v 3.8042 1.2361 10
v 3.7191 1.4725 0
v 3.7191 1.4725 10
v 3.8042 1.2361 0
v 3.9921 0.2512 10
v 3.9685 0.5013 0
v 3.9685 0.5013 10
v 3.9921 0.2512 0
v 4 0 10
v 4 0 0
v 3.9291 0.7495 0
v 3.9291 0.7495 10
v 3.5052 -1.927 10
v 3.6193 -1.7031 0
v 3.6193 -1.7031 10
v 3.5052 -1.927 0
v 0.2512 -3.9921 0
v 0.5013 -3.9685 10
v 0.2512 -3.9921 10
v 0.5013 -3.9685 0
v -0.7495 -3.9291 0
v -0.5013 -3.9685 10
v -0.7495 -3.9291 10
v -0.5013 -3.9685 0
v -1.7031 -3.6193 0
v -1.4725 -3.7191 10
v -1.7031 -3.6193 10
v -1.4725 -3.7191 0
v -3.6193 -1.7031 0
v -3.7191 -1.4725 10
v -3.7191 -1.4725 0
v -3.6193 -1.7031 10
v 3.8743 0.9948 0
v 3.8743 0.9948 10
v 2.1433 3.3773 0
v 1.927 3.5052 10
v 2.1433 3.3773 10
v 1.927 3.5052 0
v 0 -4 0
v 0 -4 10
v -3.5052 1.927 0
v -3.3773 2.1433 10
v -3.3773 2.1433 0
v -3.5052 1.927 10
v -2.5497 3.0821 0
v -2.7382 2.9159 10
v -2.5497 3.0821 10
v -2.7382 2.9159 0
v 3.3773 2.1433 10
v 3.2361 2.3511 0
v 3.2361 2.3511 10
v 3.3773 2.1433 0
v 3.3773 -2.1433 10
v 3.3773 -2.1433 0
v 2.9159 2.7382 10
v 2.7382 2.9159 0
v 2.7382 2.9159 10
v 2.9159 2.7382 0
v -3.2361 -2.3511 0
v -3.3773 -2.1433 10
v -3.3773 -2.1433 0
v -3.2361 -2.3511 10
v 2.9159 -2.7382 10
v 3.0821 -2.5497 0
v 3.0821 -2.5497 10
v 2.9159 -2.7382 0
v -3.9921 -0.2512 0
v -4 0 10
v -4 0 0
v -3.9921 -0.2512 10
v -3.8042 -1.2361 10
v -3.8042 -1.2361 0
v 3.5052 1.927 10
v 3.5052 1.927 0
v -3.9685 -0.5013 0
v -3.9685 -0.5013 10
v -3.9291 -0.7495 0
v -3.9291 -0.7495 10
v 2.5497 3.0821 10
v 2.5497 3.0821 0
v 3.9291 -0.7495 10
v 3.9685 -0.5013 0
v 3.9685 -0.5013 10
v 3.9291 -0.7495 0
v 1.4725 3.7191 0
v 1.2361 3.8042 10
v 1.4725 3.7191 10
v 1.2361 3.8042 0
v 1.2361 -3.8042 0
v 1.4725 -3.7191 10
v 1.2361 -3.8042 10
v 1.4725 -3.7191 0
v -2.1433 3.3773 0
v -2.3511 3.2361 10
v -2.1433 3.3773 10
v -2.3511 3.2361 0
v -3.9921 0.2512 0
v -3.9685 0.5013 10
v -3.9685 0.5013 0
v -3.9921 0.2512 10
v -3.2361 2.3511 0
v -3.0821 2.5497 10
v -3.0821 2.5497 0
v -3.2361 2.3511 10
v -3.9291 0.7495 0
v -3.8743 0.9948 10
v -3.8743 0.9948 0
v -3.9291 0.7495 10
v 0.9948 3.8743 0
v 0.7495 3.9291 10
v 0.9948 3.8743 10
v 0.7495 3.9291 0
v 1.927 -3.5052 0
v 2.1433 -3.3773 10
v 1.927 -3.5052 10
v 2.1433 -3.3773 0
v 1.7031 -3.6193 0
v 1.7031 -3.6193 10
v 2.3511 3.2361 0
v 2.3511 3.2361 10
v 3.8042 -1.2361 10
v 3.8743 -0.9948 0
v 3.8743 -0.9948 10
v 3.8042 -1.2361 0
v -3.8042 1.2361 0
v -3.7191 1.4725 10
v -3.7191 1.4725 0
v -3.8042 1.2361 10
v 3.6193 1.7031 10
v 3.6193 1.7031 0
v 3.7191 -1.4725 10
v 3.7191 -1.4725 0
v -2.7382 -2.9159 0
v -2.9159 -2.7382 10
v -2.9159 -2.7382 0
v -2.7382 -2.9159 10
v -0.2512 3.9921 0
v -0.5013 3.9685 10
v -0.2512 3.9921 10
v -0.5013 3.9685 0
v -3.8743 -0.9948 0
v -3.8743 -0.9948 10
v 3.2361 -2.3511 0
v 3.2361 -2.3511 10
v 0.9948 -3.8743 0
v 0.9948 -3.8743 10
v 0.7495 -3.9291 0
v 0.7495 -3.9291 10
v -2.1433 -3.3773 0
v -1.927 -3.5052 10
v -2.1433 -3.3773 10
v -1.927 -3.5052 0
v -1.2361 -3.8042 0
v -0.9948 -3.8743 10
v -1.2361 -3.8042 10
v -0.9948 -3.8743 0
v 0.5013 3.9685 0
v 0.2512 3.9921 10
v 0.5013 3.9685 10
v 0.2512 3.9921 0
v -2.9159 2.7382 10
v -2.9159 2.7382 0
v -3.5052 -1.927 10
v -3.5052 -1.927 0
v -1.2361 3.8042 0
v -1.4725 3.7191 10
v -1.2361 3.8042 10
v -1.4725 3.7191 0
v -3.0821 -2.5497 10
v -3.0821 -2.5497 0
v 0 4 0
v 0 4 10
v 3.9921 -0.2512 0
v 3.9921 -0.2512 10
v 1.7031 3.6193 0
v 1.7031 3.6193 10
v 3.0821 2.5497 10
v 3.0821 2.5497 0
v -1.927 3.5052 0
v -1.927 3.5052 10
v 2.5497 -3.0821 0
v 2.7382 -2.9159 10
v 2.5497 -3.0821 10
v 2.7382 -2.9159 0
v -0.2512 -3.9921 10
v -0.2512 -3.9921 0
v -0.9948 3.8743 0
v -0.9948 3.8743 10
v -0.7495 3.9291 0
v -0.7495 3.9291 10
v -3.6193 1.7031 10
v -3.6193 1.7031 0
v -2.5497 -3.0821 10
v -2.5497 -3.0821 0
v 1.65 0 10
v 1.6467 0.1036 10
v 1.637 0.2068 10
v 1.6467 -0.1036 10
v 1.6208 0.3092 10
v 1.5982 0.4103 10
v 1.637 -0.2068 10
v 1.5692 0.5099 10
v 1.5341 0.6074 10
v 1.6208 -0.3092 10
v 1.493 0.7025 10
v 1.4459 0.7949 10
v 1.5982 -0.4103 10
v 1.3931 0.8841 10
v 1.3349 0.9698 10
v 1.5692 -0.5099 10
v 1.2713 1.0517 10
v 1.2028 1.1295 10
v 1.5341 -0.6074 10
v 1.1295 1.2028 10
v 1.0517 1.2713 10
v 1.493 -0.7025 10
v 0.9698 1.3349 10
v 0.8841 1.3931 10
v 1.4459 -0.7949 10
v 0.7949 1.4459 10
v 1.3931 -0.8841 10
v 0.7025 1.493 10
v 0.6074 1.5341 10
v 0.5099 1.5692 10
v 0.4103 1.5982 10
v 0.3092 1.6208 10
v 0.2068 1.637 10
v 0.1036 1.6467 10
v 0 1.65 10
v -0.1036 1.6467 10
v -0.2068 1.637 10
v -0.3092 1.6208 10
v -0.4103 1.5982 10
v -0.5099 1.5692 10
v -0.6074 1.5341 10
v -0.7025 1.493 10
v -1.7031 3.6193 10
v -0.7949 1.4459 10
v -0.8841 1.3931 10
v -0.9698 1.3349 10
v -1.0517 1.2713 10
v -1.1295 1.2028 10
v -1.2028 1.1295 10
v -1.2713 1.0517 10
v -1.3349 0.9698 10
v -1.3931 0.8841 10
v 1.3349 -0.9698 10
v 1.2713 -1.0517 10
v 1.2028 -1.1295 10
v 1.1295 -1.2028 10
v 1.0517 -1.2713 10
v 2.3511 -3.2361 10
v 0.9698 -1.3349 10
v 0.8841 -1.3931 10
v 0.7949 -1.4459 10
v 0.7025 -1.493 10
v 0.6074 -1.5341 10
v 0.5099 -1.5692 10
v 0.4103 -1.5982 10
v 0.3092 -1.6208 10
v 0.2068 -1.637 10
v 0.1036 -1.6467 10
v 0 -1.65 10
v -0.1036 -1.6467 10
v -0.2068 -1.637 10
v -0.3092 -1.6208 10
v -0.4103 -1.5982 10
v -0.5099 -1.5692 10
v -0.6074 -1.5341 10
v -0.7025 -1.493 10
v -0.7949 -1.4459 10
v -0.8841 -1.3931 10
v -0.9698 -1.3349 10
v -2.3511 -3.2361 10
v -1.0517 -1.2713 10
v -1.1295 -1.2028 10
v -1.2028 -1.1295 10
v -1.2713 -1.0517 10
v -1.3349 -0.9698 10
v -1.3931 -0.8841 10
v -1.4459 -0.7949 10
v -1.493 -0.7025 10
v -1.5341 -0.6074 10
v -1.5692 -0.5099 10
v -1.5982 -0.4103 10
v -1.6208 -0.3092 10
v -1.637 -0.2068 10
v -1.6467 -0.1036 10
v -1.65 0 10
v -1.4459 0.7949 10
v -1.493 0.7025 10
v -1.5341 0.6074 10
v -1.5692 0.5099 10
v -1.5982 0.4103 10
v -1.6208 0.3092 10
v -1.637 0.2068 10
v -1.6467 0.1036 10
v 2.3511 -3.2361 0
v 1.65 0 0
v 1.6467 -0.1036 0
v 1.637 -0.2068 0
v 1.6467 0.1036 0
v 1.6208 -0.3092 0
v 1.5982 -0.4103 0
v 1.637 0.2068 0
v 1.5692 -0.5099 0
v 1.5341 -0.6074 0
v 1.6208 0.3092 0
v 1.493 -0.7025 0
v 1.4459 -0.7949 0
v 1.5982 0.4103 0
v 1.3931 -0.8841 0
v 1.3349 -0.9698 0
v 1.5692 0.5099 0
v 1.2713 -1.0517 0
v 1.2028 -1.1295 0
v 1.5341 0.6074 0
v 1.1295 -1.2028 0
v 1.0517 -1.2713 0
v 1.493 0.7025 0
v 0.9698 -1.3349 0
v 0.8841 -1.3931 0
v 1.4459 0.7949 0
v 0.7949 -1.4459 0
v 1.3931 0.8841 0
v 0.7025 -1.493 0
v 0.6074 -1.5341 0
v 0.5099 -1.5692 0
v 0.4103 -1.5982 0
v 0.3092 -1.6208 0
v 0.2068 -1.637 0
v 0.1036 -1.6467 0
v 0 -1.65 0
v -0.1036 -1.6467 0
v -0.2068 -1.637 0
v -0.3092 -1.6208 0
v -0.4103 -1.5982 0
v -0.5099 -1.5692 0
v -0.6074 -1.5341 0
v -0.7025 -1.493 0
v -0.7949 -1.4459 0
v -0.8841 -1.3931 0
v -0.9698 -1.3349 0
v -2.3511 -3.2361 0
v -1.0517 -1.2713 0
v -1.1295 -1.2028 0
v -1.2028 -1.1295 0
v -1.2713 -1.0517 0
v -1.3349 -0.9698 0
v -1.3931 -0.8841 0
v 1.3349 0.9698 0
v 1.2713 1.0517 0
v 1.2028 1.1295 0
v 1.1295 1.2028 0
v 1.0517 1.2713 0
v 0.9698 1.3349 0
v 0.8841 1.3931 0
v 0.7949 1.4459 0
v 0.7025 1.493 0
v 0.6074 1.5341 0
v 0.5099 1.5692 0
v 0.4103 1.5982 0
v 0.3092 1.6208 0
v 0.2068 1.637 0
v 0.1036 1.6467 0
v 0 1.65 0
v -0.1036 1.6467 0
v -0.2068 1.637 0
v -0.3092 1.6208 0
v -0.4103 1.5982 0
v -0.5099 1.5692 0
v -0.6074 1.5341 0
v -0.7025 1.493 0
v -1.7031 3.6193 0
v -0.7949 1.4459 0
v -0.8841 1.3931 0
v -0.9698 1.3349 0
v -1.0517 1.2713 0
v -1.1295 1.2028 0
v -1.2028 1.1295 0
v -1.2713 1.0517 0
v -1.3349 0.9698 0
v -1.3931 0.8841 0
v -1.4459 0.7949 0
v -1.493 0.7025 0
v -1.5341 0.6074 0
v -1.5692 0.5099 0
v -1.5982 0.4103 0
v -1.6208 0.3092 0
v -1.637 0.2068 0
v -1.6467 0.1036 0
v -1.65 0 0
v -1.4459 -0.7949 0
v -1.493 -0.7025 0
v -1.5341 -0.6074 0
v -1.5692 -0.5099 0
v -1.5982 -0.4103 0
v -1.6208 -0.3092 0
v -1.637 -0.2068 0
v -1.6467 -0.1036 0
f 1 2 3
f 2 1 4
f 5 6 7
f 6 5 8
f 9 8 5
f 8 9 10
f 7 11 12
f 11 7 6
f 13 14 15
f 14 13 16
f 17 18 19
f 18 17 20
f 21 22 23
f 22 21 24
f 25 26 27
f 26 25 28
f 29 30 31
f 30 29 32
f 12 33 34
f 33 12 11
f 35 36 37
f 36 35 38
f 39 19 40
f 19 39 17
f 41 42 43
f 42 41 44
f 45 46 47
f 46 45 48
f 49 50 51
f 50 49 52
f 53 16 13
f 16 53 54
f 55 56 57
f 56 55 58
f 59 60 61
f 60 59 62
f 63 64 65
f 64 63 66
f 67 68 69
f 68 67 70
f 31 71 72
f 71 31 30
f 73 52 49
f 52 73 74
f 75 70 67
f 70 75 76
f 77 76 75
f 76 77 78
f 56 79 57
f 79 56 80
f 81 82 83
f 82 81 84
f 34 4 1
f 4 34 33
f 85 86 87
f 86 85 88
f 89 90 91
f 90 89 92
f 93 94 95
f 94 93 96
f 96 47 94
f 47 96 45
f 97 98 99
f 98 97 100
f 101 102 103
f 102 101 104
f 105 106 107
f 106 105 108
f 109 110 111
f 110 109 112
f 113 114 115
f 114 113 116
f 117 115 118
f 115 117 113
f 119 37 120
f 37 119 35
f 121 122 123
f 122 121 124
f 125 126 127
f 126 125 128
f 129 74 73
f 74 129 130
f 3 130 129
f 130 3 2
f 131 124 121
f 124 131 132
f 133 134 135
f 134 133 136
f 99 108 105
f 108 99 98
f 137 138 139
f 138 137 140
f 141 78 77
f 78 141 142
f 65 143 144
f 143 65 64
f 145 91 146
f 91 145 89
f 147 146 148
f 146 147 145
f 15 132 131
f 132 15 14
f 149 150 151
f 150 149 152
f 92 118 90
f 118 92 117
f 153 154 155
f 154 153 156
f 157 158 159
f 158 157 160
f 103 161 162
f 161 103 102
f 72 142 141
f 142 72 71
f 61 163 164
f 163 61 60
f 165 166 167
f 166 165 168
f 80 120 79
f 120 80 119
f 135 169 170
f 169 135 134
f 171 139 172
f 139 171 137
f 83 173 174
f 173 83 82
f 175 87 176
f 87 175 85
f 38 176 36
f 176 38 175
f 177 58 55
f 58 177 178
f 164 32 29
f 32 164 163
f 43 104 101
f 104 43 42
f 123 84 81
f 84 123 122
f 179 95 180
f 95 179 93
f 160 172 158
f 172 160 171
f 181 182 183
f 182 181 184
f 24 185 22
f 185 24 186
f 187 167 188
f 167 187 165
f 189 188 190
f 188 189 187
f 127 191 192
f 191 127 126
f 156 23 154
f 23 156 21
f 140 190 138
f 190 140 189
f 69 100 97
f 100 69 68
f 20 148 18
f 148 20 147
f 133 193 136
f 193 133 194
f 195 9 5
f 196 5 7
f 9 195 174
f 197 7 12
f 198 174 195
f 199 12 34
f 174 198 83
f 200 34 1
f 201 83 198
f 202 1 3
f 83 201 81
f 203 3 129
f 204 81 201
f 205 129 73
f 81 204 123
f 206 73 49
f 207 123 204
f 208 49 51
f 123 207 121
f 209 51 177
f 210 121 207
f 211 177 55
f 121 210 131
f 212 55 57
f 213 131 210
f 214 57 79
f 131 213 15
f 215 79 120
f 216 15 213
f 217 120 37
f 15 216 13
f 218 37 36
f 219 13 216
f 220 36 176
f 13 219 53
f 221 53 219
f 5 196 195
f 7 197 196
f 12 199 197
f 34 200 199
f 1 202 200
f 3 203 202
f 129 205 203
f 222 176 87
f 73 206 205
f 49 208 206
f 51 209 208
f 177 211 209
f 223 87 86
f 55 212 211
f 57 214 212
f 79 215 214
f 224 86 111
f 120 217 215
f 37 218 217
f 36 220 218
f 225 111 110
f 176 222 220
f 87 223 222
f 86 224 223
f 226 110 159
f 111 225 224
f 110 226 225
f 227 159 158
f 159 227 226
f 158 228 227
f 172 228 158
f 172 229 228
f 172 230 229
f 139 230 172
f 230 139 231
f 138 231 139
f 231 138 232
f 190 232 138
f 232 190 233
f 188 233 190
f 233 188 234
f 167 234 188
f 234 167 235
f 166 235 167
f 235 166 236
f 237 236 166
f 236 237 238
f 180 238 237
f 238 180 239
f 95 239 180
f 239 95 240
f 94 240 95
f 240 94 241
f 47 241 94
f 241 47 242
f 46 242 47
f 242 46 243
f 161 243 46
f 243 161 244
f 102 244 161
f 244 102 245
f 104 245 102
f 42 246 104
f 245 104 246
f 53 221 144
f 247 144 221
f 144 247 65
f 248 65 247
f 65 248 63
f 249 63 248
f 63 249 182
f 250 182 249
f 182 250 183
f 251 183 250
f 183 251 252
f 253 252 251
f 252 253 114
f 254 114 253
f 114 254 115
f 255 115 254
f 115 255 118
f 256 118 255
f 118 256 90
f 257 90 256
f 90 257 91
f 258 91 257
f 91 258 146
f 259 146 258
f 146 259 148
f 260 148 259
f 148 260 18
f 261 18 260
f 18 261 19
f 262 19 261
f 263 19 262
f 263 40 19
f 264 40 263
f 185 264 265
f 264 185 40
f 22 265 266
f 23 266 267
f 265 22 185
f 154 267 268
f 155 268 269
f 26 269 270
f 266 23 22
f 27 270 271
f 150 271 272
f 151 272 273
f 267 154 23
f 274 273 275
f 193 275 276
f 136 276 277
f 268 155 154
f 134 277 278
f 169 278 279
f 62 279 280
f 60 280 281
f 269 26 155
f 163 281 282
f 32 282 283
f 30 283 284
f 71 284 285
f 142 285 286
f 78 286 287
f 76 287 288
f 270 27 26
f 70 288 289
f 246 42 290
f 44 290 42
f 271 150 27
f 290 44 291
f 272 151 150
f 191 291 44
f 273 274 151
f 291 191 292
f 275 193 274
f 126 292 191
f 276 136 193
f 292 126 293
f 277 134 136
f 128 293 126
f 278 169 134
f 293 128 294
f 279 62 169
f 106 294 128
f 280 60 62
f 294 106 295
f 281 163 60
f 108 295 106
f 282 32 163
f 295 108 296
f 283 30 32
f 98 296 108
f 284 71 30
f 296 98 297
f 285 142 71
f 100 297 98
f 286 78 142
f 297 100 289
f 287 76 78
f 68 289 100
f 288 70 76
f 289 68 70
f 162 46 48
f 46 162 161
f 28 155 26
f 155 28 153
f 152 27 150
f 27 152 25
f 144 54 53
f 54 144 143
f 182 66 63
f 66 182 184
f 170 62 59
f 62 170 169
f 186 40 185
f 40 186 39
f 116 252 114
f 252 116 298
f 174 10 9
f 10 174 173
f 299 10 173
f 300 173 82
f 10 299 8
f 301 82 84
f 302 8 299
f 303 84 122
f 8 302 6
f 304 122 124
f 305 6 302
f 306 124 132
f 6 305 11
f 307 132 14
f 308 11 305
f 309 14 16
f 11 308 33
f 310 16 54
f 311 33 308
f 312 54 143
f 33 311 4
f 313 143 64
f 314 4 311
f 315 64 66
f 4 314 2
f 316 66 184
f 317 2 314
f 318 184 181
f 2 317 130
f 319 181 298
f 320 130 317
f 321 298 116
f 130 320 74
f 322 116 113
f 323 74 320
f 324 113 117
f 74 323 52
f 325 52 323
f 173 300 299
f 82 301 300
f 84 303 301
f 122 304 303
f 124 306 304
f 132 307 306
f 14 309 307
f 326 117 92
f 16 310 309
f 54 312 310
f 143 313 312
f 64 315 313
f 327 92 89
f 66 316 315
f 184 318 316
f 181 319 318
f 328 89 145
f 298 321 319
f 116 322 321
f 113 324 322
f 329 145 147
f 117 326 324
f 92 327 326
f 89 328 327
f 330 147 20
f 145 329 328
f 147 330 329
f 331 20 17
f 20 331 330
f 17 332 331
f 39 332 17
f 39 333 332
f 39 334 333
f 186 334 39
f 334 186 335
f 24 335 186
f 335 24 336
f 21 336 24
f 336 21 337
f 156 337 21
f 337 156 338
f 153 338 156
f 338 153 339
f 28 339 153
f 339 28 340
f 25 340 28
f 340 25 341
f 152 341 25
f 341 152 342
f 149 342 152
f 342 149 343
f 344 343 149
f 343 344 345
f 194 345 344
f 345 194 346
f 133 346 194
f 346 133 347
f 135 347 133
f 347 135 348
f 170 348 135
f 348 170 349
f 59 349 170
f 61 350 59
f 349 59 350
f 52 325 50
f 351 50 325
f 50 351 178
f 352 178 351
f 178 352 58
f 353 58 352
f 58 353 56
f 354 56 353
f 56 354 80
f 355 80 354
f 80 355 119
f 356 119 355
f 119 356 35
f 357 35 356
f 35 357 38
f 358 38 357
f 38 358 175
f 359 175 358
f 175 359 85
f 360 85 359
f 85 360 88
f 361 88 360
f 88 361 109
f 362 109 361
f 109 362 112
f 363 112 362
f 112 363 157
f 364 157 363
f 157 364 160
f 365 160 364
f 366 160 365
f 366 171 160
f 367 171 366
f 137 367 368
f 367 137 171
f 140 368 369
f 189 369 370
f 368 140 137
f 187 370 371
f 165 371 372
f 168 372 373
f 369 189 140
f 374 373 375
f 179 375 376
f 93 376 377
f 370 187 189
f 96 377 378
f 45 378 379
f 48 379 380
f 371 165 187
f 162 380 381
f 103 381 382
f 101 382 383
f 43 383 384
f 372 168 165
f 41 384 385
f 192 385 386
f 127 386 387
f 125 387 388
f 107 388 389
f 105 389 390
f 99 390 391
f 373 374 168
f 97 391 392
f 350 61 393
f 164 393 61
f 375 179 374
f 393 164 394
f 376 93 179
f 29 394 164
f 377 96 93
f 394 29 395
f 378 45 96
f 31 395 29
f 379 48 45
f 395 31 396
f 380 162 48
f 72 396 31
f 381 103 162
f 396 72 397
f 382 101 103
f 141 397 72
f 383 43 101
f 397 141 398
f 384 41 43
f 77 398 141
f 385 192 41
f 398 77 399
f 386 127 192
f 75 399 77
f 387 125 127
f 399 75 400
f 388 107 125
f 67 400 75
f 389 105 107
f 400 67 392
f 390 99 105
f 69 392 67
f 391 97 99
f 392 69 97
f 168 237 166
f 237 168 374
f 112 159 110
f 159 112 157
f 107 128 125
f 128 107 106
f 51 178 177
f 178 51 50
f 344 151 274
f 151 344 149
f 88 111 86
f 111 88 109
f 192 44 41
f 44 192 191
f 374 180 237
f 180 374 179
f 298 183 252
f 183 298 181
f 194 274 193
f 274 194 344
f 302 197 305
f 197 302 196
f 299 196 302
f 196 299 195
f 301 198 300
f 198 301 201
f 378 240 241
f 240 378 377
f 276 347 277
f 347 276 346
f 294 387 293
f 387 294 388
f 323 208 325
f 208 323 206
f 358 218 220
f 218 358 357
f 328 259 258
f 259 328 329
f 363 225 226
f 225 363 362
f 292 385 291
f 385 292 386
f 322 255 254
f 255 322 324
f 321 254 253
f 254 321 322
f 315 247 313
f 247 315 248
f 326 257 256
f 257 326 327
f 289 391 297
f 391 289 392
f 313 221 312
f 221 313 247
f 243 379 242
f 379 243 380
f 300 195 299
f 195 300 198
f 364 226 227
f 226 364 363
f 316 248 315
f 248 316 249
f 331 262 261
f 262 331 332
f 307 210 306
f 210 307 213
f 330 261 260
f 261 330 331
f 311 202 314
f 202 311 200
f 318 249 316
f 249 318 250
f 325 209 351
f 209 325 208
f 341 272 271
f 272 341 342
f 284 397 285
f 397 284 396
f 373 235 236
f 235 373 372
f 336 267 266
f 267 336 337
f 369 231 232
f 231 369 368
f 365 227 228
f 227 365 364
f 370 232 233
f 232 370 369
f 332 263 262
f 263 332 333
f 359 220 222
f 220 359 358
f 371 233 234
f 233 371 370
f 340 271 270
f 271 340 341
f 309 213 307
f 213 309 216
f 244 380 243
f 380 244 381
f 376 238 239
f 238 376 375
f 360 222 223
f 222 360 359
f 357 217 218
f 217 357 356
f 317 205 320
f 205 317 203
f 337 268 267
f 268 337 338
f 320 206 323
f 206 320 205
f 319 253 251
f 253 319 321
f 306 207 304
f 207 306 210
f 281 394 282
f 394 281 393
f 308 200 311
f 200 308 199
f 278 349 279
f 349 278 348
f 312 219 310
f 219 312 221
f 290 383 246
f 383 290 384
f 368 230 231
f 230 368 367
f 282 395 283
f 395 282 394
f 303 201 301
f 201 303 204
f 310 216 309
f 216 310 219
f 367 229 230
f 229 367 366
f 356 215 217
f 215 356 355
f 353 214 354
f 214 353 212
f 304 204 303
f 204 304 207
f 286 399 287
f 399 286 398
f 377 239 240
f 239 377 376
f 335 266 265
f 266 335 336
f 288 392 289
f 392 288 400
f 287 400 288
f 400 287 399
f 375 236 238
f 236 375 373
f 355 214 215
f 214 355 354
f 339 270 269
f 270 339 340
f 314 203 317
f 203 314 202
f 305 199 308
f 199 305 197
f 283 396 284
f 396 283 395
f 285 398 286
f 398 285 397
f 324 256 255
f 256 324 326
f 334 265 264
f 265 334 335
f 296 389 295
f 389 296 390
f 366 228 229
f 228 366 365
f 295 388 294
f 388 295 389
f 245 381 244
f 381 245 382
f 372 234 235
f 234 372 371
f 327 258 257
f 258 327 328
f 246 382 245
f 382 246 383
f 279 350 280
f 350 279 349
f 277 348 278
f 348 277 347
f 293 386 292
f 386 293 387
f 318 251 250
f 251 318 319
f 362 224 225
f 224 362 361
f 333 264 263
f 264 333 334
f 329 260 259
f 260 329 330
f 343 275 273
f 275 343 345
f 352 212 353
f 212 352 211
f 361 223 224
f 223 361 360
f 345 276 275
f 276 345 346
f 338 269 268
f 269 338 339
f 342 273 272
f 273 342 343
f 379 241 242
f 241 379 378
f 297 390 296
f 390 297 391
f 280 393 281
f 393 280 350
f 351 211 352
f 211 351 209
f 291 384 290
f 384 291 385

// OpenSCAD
//simple pcb standoff library - By the DoomMeister
/* Types will be through hole, captured nut, split column (with and without base)
v1 - First Release
v1.1 - Tidied Split Base
v1.2 - added support for end nut
//Released under the terms of the GNU GPL v3.0
This program is free software: you can redistribute it and/or modify
it under the terms of the GNU General Public License as published by
the Free Software Foundation, either version 3 of the License, or
(at your option) any later version.

This program is distributed in the hope that it will be useful,
but WITHOUT ANY WARRANTY; without even the implied warranty of
MERCHANTABILITY or FITNESS FOR A PARTICULAR PURPOSE. See the
GNU General Public License for more details.

You should have received a copy of the GNU General Public License
along with this program. If not, see <http://www.gnu.org/licenses/>.
*/
include<MCAD/metric_fastners.scad>

//>>>>>>>>>>>>>>>>>>>>>>>>>>>>>>>>>>>>>>>>>>>>>>>>>>>>>>>>>>>>>>>>>>>>>>>>>>>
//usage
//>>>>>>>>>>>>>>>>>>>>>>>>>>>>>>>>>>>>>>>>>>>>>>>>>>>>>>>>>>>>>>>>>>>>>>>>>>>
/*
pcb_stand_off(
				type="plain",  THIS IS THE TYPE OF STAND OFF plain, end_nut, split_base 
				hex=true, 		THIS IS THE OUTSIDE SHAPE IS IT HEXAGONAL OR ROUND,NOT USED ON SPLIT TYPE
				od = 10, 		OUTSIDE DIAMETER
				id = 3,        THREAD SIZE FOR INNER DIAMETER, HOLE SIZE FOR SPLIT TYPE
				len = 12, 		LENGTH, SUPPORT HEIGHT FOR SPLIT TYPE
				cl=0.3,  		CLEARANCE
				thk_base,		BASE THICKNESS FOR SPLIT TYPE
				thk_pcb);		PCB THICKNESS


*/
//>>>>>>>>>>>>>>>>>>>>>>>>>>>>>>>>>>>>>>>>>>>>>>>>>>>>>>>>>>>>>>>>>>>>>>>>>>>
//Customiser Stuff - Comment out to use as libray
//>>>>>>>>>>>>>>>>>>>>>>>>>>>>>>>>>>>>>>>>>>>>>>>>>>>>>>>>>>>>>>>>>>>>>>>>>>>
//Setup
///*
//Plain, Retained Nut or Split Pillar With Base
Stand_Off_Type = "plain"; // [plain,end_nut,split_base]
//Round or Hex Outside
Hexagon = "false"; //[false,true]
//Outside or Base Diameter
Outside_Diameter = 8;
//Thread Size (metric ) or hole size (Split Type)
Inside_Diameter = 3;
//Length or PCB Spaceing
Length = 10;
//
Clearance = 0.3;
//(split type only)
Base_Thickness = 1.5;
//(split type only)
PCB_Thickness = 1.5;



//Thing
pcb_stand_off(type=Stand_Off_Type,hex=Hexagon, od = Outside_Diameter, id = Inside_Diameter, len = Length, cl=Clearance, thk_base=Base_Thickness,thk_pcb=PCB_Thickness);

//*/
//>>>>>>>>>>>>>>>>>>>>>>>>>>>>>>>>>>>>>>>>>>>>>>>>>>>>>>>>>>>>>>>>>>>>>>>>>>>
//draw test - comment this out for library use
//>>>>>>>>>>>>>>>>>>>>>>>>>>>>>>>>>>>>>>>>>>>>>>>>>>>>>>>>>>>>>>>>>>>>>>>>>>>
/*
spaceing = 15*1;
translate([0*spaceing,0*spaceing,0])color("red")pcb_stand_off(type="plain",hex=true, od = 10, id = 3, len = 12, cl=0.3,thk_base=3,thk_pcb=1.5);
translate([1*spaceing,0*spaceing,0])color("green")pcb_stand_off(type="end_nut",hex=false, od = 10, id = 3, len = 12, cl=0.3);
translate([1*spaceing,1*spaceing,0])color("blue")pcb_stand_off(type="split_base", od = 10, id = 3, len = 8, cl=0.3, thk_base=1.5,thk_pcb=1.5);
*/
//>>>>>>>>>>>>>>>>>>>>>>>>>>>>>>>>>>>>>>>>>>>>>>>>>>>>>>>>>>>>>>>>>>>>>>>>>>>
//outer module
//>>>>>>>>>>>>>>>>>>>>>>>>>>>>>>>>>>>>>>>>>>>>>>>>>>>>>>>>>>>>>>>>>>>>>>>>>>>

module pcb_stand_off(type="plain",hex=false, od = 2, id = 3, len = 8, cl=0.3,thk_base=3,thk_pcb=1.5)
{
if (type=="plain")
	{
		if (hex=="false")
			{
				stand_off(_od=od, _id = id,_len = len,_cl = cl);
			}
		if (hex=="true")
			{
				stand_off_hex(_od=od, _id = id,_len = len,_cl = cl);
			}
	}
if (type=="end_nut")
	{
		if (hex=="false")
			{
				end_nut_stand_off(_od=od, _id = id,_len = len,_cl = cl);
			}
		if (hex=="true")
			{
				end_nut_stand_off_hex(_od=od, _id = id,_len = len,_cl = cl);
			}
	}
if (type=="split_base")
	{

				split_base_stand_off(_od=od, _id = id,_len = len,_cl = cl,_thk_base=thk_base,_thk_pcb=thk_pcb);


	}
}

//>>>>>>>>>>>>>>>>>>>>>>>>>>>>>>>>>>>>>>>>>>>>>>>>>>>>>>>>>>>>>>>>>>>>>>>>>>>
//inner modules
//>>>>>>>>>>>>>>>>>>>>>>>>>>>>>>>>>>>>>>>>>>>>>>>>>>>>>>>>>>>>>>>>>>>>>>>>>>>

module end_nut_stand_off(_od=2, _id = 2,_len = 8,_cl = 0.3)
{
	union()
	{
	difference(){
		cylinder(r = _od/2, h = _len, $fn=100);
		translate([0,0,-1])cylinder(r = (_id + _cl)/2, h = _len+2, $fn=100);
		translate([0,0,0])flat_nut(_id+_cl,apply_chamfer=false);
		translate([0,0,_len-(0.8*(_id+_cl))+.01])flat_nut(_id+_cl,apply_chamfer=false);
		}
		translate([0,0,(0.8*(_id+_cl))])cylinder(r = _od/2, h = 0.25, $fn=100);
	}
}
module end_nut_stand_off_hex(_od=2, _id = 2,_len = 8,_cl = 0.3)
{
	union()
	{
	difference(){
		cylinder(r = _od/2, h = _len, $fn=6);
		translate([0,0,-1])cylinder(r = (_id + _cl)/2, h = _len+2, $fn=100);
		translate([0,0,0])flat_nut(_id+_cl,apply_chamfer=false);
		translate([0,0,_len-(0.8*(_id+_cl))+.01])flat_nut(_id+_cl,apply_chamfer=false);
		}
		translate([0,0,(0.8*(_id+_cl))])cylinder(r = _od/2, h = 0.25, $fn=6);
	}
}
module stand_off(_od=2, _id = 2,_len = 8,_cl = 0.3)
{
	difference(){
		cylinder(r = _od/2, h = _len, $fn=100);
		translate([0,0,-1])cylinder(r = (_id + _cl)/2, h = _len+2, $fn=100);
	}
}

module stand_off_hex(_od=2, _id = 2,_len = 8,_cl = 0.3)
{
	difference(){
		cylinder(r = _od/2, h = _len, $fn=6);
		translate([0,0,-1])cylinder(r = (_id + _cl)/2, h = _len+2, $fn=100);

	}
}

module split_base_stand_off(_od=12, _id = 2,_len = 8,_cl = 0.3,_thk_base=3,_thk_pcb=1.5)
{
	//tunables
	_top_len = 3;
	_sup_d = 2;
	_sup_ang = 30;
	//extra calcs
	_split_w=_id/3;
	_ol_len = _len+_thk_pcb+_top_len+(2*_cl);
	_sup_len = ((_sup_d/2)/tan(_sup_ang));
	_pil_d = (_id-_cl)/2;
	echo(_sup_len);
	difference(){
		union()
		{
			cylinder(r = _od/2, h = _thk_base, $fn=100);
			cylinder(r = _pil_d, h = _ol_len, $fn=100);
			translate([0,0,_len-_sup_len])cylinder(r1 = _pil_d, r2 = (_id+_sup_d)/2, h = _sup_len, $fn=100);
			translate([0,0,_len+_thk_pcb+(_cl)])cylinder(r1 = _pil_d, r2 = (_id+(1.1*_cl))/2, h = _cl, $fn=100);
			translate([0,0,_len+_thk_pcb+(2*_cl)])cylinder(r1 = (_id+(1.1*_cl))/2, r2 = _pil_d, h = _top_len, $fn=100);
		}
			
			translate([-(_id+_sup_d)/2,-_split_w/2,_len-_sup_len+_split_w])
				cube([_id+_sup_d,_split_w,_sup_len+_thk_pcb+_top_len+_cl]);
			translate([-(_id+_sup_d)/2,0,_len-_sup_len+_split_w])
			 rotate([0,90,0])
				cylinder(r=_split_w/2, h=_id+_sup_d, $fn=100);		
}
}
